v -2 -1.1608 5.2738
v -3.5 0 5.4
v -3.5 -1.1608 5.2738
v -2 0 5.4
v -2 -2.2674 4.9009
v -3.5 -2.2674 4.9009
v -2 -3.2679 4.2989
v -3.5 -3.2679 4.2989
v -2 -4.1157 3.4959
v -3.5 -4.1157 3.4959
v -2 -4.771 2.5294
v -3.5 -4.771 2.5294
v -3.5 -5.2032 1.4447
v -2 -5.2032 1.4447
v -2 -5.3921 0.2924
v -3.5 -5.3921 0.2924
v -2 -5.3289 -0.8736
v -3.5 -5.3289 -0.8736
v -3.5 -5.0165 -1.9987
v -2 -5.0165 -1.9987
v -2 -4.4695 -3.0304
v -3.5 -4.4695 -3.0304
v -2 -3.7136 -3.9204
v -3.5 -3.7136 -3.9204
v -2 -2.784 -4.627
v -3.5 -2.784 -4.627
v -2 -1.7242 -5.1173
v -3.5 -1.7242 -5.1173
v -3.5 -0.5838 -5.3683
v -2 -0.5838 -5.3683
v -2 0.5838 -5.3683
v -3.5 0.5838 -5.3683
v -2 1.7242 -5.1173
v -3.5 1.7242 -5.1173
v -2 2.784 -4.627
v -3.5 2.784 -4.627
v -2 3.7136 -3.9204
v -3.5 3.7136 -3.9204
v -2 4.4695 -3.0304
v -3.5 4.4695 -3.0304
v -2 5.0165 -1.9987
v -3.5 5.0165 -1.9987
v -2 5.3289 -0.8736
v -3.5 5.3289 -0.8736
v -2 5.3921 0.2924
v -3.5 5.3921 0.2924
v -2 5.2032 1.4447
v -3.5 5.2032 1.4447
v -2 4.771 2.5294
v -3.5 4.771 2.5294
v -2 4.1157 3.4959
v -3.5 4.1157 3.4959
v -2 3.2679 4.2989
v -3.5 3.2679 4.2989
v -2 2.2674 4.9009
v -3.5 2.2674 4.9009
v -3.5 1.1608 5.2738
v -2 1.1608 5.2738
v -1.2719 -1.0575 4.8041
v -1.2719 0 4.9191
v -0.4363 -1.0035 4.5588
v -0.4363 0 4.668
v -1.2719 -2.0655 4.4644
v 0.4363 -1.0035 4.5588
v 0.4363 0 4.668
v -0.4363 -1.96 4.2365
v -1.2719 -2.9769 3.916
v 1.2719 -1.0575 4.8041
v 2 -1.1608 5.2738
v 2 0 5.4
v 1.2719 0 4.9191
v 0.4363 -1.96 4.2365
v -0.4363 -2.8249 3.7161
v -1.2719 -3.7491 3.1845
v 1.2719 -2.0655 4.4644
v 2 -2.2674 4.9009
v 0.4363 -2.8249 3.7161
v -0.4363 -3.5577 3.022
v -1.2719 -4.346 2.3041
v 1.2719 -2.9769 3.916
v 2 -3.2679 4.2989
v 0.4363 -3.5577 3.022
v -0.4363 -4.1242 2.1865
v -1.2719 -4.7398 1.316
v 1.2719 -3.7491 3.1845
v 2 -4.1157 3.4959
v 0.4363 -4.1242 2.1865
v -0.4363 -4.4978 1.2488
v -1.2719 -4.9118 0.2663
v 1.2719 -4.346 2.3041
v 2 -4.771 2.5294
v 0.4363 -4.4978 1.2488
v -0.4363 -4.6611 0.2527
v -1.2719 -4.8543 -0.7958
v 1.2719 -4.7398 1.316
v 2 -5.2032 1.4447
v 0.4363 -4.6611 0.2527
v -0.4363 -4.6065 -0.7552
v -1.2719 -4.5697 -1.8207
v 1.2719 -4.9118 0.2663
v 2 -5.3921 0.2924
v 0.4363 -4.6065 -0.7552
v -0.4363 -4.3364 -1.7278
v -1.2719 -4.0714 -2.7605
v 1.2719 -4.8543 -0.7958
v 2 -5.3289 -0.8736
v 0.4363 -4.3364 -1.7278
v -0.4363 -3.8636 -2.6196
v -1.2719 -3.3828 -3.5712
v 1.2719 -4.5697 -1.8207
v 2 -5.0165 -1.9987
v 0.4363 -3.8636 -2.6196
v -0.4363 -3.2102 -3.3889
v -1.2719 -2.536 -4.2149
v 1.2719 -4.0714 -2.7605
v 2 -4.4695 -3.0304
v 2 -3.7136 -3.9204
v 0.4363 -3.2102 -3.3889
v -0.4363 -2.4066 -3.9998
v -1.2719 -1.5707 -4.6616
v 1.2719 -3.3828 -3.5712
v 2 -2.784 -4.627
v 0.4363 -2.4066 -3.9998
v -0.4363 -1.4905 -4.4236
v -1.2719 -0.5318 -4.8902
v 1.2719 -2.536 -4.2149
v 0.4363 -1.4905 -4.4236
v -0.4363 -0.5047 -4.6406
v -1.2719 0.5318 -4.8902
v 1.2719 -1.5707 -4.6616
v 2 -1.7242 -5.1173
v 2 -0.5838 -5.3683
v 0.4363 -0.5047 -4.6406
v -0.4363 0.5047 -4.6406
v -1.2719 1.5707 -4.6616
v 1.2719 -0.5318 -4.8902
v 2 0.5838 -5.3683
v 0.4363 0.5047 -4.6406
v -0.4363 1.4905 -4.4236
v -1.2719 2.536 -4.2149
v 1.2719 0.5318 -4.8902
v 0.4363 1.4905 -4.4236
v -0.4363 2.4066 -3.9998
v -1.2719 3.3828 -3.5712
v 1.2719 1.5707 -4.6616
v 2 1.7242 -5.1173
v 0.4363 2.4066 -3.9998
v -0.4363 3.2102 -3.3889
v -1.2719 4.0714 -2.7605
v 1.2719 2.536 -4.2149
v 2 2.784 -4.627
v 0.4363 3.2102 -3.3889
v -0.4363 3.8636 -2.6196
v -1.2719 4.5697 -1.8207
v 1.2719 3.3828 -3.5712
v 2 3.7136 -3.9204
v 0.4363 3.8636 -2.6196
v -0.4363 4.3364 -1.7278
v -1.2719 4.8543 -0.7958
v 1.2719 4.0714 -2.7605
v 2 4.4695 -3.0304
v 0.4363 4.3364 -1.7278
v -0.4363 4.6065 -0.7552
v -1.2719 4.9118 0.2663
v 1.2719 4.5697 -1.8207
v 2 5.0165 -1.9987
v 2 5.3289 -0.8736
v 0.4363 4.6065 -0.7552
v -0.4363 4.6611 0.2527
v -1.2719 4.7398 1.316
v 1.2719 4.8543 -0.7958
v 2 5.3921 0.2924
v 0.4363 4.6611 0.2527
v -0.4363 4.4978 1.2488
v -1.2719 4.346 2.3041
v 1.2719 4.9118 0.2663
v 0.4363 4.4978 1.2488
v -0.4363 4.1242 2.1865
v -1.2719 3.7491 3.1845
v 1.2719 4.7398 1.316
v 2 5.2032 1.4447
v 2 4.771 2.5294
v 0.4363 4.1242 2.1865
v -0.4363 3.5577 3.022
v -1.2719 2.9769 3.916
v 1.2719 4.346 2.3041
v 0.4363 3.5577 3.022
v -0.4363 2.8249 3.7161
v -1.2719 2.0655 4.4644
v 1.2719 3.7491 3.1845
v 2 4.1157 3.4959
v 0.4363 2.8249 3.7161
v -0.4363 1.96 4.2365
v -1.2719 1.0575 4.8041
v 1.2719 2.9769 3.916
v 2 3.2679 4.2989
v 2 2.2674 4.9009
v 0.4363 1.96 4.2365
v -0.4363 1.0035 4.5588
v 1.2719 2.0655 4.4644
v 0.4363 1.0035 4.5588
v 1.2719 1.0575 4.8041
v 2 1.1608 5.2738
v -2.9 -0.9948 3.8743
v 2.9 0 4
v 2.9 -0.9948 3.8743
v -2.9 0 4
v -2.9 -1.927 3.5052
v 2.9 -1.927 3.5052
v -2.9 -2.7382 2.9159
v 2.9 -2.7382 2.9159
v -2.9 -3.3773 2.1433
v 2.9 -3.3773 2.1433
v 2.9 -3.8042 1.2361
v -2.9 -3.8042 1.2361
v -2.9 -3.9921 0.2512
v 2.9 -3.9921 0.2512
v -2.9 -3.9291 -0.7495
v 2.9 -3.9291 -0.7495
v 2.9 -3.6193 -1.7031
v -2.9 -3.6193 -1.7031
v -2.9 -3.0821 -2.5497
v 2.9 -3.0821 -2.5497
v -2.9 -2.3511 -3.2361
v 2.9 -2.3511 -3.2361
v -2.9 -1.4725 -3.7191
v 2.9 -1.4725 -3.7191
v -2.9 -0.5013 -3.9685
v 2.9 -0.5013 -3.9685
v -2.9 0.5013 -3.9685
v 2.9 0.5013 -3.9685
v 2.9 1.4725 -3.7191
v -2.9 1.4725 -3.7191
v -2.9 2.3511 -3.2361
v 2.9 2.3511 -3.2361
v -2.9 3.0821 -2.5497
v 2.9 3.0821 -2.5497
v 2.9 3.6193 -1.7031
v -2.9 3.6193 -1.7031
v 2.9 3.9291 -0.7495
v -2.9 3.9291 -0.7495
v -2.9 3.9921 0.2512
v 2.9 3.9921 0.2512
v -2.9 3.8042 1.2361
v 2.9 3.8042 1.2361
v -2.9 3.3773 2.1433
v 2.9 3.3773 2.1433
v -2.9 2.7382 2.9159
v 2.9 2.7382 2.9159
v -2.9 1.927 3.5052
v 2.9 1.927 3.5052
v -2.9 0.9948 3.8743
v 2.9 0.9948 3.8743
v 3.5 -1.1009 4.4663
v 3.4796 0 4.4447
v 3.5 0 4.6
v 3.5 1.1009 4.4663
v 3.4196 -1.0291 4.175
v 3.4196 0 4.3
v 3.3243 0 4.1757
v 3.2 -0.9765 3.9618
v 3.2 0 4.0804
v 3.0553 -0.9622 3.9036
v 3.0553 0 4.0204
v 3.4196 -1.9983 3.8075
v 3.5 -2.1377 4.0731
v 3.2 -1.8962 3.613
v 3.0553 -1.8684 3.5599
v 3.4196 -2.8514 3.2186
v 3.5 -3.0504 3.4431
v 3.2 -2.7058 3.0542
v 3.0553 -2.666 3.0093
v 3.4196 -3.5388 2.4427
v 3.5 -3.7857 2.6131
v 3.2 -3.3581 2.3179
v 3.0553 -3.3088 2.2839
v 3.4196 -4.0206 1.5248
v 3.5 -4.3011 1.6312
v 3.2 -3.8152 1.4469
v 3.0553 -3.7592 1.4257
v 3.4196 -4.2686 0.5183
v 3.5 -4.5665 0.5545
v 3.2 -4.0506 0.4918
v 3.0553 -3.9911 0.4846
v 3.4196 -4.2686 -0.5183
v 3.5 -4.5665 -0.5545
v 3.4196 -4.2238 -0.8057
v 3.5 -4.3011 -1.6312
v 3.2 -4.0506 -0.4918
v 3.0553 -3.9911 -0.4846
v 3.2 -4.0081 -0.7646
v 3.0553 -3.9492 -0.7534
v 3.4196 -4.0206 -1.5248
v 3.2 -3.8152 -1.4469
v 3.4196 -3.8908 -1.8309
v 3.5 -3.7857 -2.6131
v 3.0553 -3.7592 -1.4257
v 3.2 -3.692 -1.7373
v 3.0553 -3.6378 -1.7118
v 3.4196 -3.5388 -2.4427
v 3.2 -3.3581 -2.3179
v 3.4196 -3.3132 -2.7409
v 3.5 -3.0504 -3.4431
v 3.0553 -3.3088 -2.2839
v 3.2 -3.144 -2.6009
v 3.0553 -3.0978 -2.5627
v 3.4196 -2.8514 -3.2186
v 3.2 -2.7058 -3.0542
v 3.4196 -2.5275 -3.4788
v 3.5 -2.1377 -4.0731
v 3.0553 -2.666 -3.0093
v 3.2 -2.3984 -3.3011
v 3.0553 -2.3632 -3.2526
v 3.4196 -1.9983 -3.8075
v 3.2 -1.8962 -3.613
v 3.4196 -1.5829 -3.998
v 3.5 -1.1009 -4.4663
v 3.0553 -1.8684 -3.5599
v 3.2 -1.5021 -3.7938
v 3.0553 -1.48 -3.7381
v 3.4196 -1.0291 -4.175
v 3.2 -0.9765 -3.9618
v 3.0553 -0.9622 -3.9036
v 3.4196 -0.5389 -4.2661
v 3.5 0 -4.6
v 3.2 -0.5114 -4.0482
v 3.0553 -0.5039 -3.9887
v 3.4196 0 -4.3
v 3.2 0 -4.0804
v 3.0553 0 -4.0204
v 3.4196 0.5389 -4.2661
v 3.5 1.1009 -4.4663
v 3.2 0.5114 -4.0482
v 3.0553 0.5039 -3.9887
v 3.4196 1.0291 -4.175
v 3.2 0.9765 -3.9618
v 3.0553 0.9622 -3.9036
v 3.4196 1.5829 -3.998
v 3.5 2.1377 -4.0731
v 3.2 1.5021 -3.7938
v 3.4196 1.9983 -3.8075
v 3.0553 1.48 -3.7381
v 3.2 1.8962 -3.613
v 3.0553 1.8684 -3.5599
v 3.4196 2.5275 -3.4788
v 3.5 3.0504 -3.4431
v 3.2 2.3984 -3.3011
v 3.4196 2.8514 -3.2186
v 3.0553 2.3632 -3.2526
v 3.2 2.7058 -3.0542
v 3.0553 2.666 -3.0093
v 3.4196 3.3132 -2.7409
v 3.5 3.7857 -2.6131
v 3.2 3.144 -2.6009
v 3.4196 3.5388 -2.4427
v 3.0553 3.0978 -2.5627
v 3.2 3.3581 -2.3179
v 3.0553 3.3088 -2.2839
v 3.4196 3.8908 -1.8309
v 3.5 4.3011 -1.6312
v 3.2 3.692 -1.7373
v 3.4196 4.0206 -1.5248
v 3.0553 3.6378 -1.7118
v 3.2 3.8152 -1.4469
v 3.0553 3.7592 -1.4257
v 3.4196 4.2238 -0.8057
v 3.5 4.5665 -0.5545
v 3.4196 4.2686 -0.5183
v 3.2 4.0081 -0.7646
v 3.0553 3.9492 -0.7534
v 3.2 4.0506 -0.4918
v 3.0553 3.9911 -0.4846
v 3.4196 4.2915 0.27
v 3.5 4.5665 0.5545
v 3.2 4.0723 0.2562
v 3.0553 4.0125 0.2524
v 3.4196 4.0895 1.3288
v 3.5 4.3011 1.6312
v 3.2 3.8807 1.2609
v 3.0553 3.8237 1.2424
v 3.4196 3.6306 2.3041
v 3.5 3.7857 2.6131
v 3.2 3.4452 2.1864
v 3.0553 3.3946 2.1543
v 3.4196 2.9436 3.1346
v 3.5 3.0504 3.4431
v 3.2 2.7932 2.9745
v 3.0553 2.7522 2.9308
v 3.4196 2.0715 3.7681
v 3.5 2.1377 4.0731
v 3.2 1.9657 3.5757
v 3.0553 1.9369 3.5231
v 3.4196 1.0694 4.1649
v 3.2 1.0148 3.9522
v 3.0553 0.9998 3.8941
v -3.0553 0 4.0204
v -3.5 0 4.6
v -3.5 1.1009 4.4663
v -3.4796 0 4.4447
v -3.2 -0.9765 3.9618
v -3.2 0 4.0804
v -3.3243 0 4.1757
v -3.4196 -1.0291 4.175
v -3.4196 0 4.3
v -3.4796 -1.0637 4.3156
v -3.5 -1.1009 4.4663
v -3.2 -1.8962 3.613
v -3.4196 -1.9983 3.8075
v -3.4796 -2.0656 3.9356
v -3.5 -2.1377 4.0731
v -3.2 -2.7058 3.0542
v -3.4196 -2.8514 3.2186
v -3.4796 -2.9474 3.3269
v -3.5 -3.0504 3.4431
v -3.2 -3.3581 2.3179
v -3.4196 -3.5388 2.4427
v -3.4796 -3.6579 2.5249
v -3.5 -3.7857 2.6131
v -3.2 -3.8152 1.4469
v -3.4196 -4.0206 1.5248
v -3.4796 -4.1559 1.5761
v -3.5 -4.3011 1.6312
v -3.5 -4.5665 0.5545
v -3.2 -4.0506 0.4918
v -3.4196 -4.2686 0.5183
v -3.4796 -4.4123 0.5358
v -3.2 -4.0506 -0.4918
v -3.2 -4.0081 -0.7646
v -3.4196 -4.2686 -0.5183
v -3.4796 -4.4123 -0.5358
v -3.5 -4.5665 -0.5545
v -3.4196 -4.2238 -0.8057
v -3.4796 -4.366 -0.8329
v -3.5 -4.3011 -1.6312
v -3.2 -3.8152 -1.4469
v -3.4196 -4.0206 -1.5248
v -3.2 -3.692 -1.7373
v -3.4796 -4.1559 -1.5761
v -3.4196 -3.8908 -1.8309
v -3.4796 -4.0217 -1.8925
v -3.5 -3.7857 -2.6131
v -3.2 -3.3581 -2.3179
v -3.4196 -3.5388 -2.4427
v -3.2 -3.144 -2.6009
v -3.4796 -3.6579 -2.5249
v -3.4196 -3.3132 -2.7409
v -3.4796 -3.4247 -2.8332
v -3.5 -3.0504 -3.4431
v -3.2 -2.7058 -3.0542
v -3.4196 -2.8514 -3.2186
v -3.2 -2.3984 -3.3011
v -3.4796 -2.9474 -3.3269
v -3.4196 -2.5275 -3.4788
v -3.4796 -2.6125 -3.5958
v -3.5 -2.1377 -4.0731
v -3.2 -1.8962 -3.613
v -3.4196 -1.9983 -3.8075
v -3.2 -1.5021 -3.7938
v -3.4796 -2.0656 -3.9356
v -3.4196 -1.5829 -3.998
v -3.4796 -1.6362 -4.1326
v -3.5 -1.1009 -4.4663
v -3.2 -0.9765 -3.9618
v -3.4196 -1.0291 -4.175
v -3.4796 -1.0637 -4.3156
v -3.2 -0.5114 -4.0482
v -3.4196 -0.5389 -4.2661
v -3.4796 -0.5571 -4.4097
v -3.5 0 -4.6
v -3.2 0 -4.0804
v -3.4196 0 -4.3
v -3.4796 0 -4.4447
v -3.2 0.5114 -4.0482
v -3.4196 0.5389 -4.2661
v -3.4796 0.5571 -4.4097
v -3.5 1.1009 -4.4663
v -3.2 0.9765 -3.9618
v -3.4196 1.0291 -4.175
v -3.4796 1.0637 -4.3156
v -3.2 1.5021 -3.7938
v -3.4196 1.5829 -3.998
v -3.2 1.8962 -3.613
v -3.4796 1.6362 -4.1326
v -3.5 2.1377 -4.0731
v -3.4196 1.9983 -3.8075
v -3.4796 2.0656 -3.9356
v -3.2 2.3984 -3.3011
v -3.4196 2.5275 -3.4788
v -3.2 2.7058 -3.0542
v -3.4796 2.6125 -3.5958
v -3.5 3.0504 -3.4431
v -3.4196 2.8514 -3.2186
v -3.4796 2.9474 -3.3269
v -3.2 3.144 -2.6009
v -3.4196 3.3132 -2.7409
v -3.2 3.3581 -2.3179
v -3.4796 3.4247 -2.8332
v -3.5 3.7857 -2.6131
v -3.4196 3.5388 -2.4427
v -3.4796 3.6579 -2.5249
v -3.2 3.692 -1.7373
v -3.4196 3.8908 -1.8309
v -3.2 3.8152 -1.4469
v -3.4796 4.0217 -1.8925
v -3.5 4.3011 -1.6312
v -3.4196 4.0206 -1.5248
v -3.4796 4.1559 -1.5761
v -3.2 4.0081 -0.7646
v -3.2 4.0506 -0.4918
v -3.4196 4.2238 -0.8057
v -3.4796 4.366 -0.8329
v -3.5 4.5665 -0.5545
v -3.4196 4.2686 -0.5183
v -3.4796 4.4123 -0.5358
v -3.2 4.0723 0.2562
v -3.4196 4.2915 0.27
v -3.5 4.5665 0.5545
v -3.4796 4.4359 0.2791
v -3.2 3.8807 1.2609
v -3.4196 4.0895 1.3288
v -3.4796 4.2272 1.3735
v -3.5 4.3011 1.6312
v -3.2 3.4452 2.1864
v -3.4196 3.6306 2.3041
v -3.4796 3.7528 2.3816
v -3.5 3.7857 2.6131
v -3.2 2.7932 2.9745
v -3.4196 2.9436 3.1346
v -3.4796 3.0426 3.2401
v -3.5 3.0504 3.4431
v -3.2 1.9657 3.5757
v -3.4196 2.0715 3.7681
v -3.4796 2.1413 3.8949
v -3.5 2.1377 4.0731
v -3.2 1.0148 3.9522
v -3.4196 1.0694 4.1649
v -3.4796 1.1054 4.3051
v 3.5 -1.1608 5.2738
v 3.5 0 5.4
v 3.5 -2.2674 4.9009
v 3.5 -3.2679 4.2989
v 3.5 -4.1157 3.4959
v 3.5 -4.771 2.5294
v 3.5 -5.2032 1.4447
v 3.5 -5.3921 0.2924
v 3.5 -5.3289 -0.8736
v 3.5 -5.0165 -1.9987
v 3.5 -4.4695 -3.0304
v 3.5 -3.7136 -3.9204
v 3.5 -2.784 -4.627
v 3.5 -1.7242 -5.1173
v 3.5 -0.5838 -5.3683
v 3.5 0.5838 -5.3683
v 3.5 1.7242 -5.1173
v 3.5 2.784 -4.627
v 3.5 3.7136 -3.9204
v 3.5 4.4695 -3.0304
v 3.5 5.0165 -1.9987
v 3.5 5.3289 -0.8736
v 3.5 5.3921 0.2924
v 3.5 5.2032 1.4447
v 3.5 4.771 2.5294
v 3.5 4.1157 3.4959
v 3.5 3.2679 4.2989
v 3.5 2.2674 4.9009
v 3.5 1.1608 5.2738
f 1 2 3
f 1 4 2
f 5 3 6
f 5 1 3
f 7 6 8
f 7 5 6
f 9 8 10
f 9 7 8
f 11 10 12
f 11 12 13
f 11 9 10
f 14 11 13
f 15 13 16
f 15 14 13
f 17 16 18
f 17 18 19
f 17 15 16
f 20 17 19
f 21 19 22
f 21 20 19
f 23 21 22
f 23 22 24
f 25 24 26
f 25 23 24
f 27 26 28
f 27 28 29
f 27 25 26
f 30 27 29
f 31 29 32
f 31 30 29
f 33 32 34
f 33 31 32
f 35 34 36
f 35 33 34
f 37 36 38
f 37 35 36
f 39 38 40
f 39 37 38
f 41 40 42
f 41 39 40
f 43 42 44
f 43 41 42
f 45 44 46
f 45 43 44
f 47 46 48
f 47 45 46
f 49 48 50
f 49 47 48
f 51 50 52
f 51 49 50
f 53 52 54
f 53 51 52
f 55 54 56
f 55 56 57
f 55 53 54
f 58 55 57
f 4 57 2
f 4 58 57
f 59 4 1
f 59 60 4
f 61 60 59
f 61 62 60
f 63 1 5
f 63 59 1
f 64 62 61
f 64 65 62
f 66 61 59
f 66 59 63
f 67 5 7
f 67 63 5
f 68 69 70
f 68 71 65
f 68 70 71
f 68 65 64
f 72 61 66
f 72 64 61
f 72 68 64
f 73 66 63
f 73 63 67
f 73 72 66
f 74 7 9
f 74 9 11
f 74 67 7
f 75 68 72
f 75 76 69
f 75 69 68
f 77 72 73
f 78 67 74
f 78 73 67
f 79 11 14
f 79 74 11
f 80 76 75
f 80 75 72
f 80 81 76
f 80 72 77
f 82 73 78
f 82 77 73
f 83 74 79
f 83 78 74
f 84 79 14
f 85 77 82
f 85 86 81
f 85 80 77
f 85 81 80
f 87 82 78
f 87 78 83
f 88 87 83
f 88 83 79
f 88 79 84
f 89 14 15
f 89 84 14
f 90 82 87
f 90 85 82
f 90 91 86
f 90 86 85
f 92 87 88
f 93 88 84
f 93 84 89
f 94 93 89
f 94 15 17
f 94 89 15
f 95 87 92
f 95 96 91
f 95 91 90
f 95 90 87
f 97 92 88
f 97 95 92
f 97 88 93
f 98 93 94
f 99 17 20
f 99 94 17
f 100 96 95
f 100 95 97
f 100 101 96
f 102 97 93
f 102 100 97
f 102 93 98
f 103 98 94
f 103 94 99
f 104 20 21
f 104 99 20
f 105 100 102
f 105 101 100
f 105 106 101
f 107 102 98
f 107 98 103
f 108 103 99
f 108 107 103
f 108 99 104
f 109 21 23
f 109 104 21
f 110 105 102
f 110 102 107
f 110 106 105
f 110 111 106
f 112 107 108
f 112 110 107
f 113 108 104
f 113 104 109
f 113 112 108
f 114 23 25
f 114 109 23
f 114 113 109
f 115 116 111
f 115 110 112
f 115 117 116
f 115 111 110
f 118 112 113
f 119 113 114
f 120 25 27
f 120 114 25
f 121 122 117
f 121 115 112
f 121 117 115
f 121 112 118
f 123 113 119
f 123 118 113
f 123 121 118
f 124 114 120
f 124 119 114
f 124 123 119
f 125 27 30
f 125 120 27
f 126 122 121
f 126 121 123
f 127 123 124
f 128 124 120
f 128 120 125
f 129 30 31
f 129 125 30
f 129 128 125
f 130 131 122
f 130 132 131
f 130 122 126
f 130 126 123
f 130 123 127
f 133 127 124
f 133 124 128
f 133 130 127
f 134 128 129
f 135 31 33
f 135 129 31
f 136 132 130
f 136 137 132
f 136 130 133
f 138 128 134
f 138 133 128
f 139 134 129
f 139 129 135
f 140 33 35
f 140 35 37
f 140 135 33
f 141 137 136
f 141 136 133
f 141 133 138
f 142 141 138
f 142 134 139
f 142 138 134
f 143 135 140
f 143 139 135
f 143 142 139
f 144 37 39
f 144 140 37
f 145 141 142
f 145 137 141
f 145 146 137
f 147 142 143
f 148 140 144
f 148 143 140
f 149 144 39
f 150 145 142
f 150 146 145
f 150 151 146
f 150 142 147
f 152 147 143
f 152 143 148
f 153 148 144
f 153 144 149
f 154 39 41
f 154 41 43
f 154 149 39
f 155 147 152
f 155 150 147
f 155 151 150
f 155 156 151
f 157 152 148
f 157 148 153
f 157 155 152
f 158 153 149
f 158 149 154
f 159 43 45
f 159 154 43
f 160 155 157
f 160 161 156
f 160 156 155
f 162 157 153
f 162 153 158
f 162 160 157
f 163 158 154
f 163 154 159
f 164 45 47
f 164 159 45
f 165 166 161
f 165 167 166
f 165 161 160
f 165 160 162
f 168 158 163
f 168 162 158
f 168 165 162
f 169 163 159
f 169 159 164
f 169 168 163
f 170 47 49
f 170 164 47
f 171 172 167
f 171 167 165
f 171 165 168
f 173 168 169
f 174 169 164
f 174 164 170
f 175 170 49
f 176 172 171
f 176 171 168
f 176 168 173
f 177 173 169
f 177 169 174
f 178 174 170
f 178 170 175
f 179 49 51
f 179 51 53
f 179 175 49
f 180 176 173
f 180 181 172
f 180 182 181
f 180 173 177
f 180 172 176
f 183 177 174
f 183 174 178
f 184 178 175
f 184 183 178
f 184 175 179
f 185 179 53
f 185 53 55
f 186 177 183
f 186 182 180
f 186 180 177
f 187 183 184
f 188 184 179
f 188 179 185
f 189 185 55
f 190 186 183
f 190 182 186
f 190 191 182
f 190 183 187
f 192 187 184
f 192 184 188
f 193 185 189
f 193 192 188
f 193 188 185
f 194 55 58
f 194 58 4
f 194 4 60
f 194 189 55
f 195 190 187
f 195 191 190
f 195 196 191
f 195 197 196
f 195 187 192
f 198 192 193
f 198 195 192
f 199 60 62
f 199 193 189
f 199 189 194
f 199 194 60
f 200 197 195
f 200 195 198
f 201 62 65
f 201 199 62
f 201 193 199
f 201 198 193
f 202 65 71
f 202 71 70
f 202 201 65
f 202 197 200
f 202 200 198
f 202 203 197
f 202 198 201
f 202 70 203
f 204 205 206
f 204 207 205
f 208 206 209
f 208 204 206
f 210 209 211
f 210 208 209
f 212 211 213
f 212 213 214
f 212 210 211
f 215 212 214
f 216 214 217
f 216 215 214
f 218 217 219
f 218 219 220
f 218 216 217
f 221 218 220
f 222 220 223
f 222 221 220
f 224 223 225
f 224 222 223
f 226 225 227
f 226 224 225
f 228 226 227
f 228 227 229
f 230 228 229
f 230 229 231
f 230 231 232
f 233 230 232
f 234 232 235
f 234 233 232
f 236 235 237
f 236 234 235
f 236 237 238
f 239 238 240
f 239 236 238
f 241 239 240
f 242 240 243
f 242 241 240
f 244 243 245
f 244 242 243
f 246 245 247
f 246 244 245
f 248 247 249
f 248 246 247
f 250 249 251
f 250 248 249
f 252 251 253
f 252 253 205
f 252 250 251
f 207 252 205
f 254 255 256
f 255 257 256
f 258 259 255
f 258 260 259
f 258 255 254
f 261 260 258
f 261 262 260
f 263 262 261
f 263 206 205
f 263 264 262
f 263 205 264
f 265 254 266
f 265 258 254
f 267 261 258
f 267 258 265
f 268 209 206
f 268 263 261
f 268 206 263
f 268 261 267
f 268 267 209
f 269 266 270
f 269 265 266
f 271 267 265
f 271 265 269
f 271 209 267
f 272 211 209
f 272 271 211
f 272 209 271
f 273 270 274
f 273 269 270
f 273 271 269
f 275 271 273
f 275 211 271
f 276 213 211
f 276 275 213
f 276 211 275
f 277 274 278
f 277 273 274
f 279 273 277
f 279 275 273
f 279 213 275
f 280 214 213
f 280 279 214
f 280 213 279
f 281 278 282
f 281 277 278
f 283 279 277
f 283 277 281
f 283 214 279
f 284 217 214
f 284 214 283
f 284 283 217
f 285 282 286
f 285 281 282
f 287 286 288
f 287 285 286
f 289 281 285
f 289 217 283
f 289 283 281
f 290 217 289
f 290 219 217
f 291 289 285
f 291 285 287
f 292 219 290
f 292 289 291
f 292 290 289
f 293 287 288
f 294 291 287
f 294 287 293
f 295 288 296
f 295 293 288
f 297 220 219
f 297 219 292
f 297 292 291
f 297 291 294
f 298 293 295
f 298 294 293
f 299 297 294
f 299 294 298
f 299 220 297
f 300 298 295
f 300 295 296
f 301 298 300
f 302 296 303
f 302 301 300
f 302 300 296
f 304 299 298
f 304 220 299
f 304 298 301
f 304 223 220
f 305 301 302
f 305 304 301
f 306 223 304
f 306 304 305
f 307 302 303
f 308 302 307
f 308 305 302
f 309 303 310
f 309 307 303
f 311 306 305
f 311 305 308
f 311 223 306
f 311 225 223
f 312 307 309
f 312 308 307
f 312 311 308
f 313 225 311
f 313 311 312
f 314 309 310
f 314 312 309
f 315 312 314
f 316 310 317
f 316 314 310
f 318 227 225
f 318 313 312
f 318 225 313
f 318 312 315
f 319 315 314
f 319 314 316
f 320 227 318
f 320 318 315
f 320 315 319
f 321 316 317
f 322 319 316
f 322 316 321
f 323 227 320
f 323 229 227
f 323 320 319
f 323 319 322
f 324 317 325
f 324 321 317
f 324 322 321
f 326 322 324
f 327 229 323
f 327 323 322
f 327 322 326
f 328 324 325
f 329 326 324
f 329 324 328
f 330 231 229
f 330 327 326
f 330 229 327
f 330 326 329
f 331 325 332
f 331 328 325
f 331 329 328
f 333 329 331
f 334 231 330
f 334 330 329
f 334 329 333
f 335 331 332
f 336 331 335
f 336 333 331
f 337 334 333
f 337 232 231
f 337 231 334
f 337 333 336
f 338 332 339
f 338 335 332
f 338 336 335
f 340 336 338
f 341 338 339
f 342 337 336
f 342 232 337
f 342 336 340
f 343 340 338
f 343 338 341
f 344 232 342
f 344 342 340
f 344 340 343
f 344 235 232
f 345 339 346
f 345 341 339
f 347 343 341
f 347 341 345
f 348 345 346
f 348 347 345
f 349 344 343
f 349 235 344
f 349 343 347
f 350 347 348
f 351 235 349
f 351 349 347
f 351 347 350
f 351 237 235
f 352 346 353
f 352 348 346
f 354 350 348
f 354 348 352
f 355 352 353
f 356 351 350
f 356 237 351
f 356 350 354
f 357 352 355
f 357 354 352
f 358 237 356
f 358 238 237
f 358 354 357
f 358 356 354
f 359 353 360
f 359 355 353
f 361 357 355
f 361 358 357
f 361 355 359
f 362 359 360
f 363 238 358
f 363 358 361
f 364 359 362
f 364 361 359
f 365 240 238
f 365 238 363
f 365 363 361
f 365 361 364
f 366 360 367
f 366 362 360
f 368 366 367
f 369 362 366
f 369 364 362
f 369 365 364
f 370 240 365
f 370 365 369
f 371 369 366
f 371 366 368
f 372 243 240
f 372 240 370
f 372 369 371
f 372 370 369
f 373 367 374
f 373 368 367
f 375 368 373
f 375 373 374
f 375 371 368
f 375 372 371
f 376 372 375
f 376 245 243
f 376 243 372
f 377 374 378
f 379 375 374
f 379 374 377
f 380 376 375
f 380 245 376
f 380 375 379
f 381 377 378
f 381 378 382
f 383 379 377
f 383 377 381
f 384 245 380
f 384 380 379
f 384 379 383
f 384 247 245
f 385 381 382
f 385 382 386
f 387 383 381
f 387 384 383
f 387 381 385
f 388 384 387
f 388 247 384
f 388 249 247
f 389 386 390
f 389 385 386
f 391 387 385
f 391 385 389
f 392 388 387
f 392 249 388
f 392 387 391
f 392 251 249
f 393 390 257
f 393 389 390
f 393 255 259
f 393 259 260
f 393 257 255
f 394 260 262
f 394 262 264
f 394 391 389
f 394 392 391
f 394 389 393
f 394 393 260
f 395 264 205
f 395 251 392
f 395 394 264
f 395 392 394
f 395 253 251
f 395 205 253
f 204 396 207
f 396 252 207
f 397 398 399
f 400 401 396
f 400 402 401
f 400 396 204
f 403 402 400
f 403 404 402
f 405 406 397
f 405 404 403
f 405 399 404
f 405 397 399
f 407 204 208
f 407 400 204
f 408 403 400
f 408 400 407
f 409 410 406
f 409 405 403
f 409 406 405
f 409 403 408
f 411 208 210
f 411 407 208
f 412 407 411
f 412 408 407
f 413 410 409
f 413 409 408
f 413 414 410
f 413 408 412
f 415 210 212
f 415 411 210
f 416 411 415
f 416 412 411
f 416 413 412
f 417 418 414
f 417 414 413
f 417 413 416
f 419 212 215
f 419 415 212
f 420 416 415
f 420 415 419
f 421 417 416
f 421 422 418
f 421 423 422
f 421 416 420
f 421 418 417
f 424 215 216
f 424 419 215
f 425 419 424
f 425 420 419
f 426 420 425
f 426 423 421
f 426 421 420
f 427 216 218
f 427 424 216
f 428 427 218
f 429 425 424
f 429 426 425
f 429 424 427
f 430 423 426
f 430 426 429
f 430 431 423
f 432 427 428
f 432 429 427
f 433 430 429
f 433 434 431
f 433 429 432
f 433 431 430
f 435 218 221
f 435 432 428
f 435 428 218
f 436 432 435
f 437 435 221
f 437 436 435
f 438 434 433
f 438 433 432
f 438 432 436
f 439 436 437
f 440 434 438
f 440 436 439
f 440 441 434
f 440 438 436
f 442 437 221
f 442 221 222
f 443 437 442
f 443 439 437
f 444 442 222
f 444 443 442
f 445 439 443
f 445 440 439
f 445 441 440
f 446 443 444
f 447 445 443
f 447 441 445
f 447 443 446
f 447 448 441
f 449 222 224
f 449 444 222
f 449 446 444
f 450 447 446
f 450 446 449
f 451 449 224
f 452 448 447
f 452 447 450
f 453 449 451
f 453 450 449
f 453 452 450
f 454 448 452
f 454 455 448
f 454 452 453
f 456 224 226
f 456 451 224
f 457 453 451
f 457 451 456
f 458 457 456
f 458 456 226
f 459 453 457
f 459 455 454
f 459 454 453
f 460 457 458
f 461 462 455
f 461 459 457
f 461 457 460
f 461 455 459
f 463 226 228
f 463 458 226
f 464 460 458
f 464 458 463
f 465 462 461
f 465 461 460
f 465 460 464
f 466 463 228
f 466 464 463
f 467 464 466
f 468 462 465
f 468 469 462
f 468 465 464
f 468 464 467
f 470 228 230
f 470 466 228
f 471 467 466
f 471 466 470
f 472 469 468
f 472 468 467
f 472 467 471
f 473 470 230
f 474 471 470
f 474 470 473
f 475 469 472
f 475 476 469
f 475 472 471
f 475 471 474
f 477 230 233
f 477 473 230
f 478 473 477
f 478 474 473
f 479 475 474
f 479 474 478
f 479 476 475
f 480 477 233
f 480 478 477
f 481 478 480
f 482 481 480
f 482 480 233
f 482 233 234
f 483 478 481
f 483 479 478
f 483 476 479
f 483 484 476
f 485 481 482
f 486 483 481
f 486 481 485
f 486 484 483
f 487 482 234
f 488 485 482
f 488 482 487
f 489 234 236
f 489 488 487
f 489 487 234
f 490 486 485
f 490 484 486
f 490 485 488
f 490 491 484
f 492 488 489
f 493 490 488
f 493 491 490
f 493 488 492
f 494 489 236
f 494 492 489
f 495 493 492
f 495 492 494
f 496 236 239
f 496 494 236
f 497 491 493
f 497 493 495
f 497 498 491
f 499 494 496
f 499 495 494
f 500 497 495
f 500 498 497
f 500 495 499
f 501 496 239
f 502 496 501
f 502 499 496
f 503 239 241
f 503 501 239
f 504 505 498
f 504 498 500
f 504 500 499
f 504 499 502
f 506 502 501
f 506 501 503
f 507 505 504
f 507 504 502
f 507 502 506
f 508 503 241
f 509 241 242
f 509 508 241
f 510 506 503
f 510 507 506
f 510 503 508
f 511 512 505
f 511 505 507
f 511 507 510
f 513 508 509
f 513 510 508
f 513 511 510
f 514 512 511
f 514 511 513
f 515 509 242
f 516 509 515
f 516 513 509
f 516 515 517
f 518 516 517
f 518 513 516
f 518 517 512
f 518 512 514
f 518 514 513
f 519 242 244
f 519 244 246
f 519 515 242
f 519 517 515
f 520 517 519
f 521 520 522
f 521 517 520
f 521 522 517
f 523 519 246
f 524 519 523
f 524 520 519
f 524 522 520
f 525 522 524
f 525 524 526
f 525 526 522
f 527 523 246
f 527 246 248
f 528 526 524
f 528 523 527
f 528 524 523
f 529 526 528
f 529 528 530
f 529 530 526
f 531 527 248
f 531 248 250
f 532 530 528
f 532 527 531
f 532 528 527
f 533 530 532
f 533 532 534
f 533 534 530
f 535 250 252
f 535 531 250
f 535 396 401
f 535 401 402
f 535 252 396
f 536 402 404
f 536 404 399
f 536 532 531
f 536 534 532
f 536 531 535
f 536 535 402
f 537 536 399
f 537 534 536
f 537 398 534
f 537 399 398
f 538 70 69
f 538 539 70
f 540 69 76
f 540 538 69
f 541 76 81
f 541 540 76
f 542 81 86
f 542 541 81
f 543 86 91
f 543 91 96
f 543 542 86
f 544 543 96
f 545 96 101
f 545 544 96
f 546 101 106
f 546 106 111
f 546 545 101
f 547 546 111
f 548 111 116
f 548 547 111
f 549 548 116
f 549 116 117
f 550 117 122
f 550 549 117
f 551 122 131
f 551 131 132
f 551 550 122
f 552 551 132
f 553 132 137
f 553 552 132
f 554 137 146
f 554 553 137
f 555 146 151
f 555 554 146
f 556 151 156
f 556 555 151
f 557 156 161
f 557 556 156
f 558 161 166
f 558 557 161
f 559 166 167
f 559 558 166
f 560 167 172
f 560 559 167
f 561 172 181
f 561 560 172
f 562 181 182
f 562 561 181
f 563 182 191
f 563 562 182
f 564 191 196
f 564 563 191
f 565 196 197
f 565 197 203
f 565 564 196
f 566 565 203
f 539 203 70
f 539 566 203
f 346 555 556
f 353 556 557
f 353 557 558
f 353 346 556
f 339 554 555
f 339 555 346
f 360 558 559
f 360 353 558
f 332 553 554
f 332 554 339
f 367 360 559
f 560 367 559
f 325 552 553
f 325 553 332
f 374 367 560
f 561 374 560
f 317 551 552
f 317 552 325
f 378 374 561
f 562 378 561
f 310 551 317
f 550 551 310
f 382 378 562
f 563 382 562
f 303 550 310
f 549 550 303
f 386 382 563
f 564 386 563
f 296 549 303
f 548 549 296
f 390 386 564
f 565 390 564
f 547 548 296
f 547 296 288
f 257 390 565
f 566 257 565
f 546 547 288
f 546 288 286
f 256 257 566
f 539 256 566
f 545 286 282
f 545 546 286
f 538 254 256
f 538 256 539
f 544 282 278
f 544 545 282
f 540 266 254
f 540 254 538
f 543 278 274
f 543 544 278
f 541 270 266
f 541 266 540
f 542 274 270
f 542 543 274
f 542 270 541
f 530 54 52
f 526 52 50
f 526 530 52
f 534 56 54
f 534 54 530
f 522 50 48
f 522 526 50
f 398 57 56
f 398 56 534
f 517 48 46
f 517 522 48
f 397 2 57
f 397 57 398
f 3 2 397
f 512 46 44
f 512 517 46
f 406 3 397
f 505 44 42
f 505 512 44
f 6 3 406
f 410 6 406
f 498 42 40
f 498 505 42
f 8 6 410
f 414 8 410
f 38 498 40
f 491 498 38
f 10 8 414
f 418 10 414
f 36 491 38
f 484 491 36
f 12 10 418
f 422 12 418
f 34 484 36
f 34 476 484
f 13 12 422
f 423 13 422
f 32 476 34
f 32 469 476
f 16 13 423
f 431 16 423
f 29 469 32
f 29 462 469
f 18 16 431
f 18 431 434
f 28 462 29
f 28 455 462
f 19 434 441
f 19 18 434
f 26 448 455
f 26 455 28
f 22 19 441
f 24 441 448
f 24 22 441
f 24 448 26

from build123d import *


with BuildPart() as part:
    # Çizim1 → Döndür1 (revolve)
    with BuildSketch(Plane.XY, mode=Mode.PRIVATE) as d_nd_r1_sk:
        with BuildLine():
            Line((3.5, 5.4), (3.5, 4.6))
            ThreePointArc((3.5, 4.6), (3.324264069, 4.175735931), (2.9, 4))
            Line((2.9, 4), (-2.9, 4))
            ThreePointArc((-2.9, 4), (-3.324264069, 4.175735931), (-3.5, 4.6))
            Line((-3.5, 4.6), (-3.5, 5.4))
            Line((-3.5, 5.4), (-2, 5.4))
            ThreePointArc((-2, 5.4), (0, 4.636067977), (2, 5.4))
            Line((2, 5.4), (3.5, 5.4))
        make_face()
    revolve(d_nd_r1_sk.sketch.rotate(Axis((-20.148687567, 0, 0), (1, 0, 0)), 90), axis=Axis((-20.148687567, 0, 0), (1, 0, 0)))


solid = part.part
